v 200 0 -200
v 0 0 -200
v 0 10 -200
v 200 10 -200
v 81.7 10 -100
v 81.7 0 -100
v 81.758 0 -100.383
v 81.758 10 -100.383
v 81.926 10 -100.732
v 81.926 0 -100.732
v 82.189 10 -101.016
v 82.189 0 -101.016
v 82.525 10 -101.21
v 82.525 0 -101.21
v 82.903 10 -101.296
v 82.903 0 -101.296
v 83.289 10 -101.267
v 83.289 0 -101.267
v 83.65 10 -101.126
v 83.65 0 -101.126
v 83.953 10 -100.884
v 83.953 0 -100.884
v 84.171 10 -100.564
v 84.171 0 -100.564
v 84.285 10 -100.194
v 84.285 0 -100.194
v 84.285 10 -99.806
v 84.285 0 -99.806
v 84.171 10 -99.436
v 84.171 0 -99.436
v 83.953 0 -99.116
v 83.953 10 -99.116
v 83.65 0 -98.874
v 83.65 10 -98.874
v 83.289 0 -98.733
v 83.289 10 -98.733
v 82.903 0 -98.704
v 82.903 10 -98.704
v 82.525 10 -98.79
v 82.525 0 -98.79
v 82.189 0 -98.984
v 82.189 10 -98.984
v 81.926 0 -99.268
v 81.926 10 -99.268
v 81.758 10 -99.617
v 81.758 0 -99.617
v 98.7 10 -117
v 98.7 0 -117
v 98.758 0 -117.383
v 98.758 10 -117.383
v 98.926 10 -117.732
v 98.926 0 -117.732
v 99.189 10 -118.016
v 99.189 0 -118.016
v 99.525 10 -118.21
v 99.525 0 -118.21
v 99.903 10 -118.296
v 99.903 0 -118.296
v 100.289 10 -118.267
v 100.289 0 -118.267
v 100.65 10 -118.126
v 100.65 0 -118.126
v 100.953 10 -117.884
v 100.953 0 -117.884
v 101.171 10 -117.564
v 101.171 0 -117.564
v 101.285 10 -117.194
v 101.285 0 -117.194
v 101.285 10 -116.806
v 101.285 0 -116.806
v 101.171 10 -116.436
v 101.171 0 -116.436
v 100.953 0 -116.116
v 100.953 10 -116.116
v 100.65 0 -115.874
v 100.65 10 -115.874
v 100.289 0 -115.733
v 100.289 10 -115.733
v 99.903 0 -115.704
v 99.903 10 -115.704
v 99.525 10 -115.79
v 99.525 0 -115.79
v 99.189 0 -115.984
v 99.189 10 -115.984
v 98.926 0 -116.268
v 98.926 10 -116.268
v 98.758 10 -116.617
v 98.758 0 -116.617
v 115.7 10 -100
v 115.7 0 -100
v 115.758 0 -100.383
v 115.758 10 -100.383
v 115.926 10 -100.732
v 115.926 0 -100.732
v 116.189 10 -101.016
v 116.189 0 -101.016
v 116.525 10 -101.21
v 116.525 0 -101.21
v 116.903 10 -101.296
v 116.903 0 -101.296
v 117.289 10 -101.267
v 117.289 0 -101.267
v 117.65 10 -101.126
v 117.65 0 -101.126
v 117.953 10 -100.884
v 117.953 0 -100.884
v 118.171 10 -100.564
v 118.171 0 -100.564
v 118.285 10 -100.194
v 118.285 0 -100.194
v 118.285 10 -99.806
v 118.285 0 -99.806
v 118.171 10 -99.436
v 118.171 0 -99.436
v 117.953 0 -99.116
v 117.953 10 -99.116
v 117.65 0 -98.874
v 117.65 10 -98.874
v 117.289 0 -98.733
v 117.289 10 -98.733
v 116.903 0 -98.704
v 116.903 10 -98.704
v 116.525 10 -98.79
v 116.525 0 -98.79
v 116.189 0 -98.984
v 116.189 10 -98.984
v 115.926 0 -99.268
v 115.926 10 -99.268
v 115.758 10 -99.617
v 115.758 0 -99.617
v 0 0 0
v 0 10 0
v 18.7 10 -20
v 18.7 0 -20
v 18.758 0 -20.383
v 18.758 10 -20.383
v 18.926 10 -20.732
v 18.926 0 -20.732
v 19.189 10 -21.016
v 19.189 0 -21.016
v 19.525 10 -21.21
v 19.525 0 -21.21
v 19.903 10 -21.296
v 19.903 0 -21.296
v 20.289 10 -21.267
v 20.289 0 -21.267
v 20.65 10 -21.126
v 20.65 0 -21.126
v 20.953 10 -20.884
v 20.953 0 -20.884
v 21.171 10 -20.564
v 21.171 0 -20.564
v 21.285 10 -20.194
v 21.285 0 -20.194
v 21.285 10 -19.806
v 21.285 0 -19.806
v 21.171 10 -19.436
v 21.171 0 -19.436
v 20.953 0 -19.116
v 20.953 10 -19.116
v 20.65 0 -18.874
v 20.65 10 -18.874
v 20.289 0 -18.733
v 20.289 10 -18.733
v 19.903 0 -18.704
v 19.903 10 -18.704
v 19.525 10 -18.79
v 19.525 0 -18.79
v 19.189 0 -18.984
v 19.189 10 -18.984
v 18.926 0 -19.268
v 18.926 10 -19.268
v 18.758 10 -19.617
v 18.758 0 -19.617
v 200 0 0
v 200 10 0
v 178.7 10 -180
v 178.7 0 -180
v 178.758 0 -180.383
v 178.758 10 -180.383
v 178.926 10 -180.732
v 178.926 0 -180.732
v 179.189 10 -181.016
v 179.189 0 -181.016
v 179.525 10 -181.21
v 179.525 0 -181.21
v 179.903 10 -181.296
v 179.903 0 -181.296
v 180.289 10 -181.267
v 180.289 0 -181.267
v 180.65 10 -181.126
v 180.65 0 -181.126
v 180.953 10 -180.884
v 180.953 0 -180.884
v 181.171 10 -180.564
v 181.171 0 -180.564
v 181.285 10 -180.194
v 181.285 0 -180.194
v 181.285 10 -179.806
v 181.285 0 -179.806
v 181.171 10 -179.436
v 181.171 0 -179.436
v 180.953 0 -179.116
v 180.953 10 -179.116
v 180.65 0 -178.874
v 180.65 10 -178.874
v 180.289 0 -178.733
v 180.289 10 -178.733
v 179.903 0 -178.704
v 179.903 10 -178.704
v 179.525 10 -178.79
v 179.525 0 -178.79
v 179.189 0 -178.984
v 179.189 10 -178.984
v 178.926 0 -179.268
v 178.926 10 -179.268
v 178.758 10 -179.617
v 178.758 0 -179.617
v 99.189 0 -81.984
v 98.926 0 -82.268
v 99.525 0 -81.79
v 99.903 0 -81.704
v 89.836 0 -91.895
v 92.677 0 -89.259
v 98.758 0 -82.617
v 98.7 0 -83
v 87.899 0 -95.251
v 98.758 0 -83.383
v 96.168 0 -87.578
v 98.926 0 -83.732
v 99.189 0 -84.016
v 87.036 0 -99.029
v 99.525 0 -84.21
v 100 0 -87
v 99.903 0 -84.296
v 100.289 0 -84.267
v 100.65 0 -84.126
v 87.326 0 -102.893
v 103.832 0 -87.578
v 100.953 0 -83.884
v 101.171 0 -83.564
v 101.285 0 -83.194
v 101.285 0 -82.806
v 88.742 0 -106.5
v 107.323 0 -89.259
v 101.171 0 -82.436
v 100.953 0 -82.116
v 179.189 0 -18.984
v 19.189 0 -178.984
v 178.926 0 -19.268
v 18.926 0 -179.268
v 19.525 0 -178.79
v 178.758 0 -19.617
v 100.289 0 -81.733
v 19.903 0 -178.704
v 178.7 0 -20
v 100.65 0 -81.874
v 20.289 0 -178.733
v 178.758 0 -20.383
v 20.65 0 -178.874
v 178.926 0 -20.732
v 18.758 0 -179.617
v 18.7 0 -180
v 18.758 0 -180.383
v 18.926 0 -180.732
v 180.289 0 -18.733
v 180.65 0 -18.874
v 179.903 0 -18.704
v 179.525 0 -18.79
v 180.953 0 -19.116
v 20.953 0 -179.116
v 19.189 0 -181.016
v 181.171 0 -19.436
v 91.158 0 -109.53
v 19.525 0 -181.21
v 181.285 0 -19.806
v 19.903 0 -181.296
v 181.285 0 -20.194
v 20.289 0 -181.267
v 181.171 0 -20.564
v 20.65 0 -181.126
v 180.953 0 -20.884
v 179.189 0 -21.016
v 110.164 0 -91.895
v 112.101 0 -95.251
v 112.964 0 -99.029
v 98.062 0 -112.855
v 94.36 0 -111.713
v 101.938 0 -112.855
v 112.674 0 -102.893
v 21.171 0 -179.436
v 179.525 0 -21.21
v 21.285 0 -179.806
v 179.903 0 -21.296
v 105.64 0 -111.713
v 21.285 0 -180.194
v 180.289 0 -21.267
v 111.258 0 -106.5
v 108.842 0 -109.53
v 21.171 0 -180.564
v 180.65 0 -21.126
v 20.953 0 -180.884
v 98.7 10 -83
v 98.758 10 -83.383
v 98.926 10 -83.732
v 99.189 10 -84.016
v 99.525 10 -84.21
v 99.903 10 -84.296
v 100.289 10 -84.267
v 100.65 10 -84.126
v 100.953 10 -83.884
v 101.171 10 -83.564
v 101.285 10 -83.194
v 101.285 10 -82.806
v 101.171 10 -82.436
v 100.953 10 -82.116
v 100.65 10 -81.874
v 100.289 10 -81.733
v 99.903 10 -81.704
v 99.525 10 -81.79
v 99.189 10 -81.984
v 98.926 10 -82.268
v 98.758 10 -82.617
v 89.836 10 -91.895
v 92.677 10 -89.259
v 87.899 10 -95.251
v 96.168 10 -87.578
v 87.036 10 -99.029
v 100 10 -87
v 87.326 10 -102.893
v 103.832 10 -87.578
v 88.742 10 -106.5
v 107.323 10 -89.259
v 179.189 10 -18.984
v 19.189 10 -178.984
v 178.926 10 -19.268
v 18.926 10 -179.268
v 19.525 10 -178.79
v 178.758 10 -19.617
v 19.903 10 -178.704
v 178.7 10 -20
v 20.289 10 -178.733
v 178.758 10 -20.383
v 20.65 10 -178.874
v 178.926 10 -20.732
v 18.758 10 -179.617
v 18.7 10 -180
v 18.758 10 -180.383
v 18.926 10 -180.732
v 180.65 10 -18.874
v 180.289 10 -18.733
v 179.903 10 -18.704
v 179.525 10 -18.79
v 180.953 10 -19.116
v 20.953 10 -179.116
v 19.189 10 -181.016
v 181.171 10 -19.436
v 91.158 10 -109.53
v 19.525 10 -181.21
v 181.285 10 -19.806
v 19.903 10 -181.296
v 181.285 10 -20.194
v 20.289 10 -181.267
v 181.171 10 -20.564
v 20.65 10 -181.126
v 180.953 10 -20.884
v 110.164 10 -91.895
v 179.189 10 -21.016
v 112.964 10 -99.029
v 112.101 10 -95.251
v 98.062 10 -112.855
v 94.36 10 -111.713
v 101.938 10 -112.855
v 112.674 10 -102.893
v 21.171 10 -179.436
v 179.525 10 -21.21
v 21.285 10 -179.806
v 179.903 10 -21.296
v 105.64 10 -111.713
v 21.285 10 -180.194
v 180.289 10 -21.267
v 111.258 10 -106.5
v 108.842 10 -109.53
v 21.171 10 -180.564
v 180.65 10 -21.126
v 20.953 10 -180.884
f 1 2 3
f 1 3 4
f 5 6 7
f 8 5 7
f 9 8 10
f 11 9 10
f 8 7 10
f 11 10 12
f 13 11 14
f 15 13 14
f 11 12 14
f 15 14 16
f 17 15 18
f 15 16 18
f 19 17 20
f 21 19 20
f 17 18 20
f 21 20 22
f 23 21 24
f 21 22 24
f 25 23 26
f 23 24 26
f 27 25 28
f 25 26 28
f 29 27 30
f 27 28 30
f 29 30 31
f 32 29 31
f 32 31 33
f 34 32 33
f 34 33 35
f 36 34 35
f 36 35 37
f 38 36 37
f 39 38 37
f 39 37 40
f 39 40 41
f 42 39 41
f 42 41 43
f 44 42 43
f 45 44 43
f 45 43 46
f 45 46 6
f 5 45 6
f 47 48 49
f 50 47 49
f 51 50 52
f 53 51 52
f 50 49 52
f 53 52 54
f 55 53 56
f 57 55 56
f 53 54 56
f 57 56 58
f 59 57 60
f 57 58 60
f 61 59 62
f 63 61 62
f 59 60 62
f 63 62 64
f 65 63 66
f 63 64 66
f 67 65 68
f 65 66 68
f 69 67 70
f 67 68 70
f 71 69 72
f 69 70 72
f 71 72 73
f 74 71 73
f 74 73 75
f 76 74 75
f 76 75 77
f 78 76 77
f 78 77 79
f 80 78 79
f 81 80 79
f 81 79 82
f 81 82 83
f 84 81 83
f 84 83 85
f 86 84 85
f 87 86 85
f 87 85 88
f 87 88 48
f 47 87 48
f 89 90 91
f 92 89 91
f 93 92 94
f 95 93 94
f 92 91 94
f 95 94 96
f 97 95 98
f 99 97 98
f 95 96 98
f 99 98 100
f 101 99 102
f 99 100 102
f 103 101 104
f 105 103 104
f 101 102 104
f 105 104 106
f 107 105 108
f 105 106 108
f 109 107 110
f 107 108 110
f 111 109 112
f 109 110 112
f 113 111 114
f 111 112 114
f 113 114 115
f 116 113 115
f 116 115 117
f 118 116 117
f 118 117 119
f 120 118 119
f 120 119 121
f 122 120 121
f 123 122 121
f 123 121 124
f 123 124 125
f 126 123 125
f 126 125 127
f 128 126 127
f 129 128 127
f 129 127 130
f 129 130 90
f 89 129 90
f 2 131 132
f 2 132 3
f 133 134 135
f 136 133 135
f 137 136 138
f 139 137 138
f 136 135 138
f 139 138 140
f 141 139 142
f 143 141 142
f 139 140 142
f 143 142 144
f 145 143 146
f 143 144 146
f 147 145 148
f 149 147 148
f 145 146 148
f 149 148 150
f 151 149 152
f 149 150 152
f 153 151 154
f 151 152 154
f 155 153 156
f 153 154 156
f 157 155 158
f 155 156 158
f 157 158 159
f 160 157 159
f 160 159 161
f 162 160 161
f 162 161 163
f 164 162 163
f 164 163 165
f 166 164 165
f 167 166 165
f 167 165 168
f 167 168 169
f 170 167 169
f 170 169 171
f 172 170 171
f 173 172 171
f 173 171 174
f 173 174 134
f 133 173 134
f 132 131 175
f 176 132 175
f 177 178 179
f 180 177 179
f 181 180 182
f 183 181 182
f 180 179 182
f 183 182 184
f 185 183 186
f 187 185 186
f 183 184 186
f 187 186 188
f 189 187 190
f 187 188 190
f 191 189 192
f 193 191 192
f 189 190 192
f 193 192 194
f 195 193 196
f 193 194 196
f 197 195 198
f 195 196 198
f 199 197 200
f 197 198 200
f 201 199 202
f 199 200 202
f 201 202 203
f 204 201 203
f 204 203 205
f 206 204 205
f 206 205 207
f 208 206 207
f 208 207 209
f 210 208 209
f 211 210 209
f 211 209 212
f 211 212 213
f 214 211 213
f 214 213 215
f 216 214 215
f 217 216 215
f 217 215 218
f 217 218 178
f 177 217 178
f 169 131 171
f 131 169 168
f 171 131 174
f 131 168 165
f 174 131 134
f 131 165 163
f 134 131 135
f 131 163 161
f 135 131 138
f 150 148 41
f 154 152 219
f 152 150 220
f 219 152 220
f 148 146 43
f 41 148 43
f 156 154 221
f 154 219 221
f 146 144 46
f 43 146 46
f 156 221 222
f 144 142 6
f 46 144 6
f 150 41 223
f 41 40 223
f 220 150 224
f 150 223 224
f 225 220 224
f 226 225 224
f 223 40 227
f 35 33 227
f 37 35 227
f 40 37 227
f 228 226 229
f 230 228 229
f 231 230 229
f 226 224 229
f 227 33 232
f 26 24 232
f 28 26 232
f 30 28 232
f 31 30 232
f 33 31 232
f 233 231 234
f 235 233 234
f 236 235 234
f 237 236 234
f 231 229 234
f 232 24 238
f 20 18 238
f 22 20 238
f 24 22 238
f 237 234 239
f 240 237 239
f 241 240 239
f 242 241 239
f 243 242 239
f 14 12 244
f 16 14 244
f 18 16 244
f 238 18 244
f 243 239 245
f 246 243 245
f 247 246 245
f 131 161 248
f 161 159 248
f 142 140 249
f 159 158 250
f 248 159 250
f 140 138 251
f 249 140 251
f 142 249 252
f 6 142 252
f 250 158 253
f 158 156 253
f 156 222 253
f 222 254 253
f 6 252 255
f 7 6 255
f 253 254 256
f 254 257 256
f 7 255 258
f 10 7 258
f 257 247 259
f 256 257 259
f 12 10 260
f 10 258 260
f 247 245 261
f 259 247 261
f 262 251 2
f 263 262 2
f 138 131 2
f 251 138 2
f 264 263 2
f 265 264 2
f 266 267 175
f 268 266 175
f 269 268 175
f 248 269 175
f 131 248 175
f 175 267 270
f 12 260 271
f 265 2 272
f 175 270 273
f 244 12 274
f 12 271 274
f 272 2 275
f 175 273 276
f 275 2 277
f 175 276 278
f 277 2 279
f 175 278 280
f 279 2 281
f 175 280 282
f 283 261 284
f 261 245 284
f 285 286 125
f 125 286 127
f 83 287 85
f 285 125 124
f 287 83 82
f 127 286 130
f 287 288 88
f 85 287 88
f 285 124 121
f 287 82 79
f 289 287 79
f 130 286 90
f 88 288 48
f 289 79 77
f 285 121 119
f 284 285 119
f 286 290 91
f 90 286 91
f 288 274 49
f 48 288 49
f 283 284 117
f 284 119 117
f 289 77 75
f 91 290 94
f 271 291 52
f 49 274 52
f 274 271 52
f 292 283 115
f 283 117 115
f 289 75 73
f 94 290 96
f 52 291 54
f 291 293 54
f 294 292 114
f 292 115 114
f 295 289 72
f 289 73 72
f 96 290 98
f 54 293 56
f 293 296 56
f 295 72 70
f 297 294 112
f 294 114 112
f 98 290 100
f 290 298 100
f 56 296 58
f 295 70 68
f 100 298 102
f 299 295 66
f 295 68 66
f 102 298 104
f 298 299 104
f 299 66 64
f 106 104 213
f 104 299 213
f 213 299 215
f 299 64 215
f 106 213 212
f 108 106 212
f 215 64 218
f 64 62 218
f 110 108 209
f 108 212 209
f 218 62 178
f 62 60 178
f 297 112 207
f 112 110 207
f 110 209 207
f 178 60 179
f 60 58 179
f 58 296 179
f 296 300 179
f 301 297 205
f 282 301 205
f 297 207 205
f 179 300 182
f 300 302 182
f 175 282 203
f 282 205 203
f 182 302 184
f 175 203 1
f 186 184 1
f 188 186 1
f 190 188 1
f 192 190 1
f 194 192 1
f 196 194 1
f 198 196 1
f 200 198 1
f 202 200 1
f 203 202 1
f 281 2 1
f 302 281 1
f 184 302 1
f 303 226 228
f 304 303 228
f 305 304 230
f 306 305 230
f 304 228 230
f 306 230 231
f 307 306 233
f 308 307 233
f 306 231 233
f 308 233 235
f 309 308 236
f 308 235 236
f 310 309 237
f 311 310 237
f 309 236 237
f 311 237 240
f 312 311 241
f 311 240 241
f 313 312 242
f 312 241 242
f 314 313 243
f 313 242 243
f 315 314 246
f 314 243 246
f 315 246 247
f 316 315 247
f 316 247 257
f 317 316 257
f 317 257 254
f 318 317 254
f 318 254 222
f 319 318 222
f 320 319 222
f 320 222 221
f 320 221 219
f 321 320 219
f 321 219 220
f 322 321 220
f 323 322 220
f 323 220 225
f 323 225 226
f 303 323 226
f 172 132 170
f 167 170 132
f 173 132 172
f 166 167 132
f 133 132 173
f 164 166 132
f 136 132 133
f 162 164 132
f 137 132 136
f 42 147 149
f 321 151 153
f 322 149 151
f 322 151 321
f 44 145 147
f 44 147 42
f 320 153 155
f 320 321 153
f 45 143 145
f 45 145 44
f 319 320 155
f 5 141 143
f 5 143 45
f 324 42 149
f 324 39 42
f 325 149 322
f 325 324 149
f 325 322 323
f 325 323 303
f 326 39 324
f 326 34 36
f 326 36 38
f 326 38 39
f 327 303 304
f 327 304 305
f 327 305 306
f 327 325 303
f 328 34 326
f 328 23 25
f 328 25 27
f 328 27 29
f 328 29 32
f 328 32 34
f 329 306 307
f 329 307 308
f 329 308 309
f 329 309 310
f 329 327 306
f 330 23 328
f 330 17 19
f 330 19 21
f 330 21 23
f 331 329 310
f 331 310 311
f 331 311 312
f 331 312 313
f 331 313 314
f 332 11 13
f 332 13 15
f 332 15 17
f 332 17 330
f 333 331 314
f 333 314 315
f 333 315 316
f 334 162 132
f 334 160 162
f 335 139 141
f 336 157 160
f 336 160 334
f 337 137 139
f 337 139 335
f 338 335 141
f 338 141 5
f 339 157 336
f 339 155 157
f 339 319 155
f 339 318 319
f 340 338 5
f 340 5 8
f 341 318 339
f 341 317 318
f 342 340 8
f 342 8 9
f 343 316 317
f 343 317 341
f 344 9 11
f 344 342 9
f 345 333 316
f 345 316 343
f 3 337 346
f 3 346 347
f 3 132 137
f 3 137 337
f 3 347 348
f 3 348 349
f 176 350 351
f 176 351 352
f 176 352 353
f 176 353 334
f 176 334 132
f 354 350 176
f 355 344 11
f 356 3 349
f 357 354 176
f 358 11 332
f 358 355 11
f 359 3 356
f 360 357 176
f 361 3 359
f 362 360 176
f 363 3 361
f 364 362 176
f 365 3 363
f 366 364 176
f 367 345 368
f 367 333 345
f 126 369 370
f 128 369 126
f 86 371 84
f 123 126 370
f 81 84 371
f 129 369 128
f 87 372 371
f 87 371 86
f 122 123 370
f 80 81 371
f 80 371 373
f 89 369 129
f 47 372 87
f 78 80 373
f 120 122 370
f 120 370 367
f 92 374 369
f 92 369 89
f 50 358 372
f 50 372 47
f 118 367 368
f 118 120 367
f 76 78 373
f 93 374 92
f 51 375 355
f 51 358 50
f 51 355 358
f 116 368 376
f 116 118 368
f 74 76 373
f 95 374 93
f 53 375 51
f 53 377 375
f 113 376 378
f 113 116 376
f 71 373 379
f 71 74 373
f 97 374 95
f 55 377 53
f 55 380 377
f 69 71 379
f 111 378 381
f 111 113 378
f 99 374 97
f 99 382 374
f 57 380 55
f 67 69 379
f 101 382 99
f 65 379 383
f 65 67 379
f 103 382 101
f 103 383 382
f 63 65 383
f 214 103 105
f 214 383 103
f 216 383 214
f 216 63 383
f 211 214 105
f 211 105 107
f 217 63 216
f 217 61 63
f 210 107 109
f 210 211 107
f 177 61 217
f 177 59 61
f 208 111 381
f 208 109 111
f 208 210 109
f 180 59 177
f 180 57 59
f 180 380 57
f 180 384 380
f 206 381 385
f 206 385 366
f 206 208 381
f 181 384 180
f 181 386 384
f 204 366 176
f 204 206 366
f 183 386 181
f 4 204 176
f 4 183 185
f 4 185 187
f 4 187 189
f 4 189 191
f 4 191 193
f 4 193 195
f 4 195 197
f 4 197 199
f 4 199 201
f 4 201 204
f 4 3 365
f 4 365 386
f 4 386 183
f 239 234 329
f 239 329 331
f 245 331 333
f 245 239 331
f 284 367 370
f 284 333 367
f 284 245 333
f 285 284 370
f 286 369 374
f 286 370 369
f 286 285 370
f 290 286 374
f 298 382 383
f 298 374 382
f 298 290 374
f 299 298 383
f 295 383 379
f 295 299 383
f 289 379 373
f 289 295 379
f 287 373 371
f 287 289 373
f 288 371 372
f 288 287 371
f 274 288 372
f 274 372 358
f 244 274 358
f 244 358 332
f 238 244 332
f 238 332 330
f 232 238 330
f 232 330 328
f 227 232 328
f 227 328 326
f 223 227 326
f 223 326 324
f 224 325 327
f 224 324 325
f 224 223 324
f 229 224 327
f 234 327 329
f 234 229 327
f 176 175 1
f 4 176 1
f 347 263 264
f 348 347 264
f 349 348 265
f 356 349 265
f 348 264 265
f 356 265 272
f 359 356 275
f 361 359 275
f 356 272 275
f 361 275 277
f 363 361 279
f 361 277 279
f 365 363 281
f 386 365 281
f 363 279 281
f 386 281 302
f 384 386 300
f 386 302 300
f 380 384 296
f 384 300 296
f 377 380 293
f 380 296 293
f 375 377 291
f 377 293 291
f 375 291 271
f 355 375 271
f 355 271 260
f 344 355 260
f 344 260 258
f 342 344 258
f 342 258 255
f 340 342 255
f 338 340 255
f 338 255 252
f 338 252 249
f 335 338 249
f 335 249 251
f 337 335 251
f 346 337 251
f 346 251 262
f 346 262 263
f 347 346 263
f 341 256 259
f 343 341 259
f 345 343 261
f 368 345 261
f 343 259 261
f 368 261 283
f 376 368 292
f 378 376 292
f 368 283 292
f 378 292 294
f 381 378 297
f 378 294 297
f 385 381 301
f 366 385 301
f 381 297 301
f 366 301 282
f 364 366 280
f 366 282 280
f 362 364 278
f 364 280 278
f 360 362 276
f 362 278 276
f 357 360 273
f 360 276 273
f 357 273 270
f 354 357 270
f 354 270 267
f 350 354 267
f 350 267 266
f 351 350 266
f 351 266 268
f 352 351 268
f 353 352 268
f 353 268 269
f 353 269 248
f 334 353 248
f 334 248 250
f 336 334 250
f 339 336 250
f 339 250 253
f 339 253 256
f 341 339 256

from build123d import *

# Parameters (mm, degrees)
SKETCH1_W                   = 200
SKETCH1_H                   = 200
BOSS_EXTRUDE1_DEPTH         = 10
CUT_EXTRUDE2_DEPTH          = 284.019433962
CUT_EXTRUDE2_DEPTH_BACK     = 284.019433962
SKETCH2_R                   = 13
TAP_DRILL_FOR_M3X0_5_TAP1_D = 2.6


with BuildPart() as part:
    # Sketch1 → Boss-Extrude1 (new body)
    with BuildSketch(Plane(origin=(0, 0, 0), x_dir=(1, 0, 0), z_dir=(0, 1, 0))):
        with Locations((100, 100)):
            Rectangle(SKETCH1_W, SKETCH1_H)
    extrude(amount=BOSS_EXTRUDE1_DEPTH)

    # Sketch2 → Cut-Extrude2 (cut, two sides: drawn at the far end of the back side and taken through both)
    with BuildSketch(Plane(origin=(0, 0, 0), x_dir=(1, 0, 0), z_dir=(0, 1, 0)).offset(-CUT_EXTRUDE2_DEPTH_BACK)):
        with Locations(Location((100, 100, 0), (0, 0, 270))):
            Circle(SKETCH2_R)
    extrude(amount=CUT_EXTRUDE2_DEPTH + CUT_EXTRUDE2_DEPTH_BACK, mode=Mode.SUBTRACT)

    # Tap Drill for M3x0.5 Tap1 (through all)
    with Locations(Plane(origin=(0, 10, 0), x_dir=(1, 0, 0), z_dir=(0, 1, 0))):
        with Locations((20, 180), (180, 180), (180, 20), (20, 20), (100, 117), (117, 100), (100, 83), (83, 100)):
            Hole(TAP_DRILL_FOR_M3X0_5_TAP1_D / 2)


solid = part.part
